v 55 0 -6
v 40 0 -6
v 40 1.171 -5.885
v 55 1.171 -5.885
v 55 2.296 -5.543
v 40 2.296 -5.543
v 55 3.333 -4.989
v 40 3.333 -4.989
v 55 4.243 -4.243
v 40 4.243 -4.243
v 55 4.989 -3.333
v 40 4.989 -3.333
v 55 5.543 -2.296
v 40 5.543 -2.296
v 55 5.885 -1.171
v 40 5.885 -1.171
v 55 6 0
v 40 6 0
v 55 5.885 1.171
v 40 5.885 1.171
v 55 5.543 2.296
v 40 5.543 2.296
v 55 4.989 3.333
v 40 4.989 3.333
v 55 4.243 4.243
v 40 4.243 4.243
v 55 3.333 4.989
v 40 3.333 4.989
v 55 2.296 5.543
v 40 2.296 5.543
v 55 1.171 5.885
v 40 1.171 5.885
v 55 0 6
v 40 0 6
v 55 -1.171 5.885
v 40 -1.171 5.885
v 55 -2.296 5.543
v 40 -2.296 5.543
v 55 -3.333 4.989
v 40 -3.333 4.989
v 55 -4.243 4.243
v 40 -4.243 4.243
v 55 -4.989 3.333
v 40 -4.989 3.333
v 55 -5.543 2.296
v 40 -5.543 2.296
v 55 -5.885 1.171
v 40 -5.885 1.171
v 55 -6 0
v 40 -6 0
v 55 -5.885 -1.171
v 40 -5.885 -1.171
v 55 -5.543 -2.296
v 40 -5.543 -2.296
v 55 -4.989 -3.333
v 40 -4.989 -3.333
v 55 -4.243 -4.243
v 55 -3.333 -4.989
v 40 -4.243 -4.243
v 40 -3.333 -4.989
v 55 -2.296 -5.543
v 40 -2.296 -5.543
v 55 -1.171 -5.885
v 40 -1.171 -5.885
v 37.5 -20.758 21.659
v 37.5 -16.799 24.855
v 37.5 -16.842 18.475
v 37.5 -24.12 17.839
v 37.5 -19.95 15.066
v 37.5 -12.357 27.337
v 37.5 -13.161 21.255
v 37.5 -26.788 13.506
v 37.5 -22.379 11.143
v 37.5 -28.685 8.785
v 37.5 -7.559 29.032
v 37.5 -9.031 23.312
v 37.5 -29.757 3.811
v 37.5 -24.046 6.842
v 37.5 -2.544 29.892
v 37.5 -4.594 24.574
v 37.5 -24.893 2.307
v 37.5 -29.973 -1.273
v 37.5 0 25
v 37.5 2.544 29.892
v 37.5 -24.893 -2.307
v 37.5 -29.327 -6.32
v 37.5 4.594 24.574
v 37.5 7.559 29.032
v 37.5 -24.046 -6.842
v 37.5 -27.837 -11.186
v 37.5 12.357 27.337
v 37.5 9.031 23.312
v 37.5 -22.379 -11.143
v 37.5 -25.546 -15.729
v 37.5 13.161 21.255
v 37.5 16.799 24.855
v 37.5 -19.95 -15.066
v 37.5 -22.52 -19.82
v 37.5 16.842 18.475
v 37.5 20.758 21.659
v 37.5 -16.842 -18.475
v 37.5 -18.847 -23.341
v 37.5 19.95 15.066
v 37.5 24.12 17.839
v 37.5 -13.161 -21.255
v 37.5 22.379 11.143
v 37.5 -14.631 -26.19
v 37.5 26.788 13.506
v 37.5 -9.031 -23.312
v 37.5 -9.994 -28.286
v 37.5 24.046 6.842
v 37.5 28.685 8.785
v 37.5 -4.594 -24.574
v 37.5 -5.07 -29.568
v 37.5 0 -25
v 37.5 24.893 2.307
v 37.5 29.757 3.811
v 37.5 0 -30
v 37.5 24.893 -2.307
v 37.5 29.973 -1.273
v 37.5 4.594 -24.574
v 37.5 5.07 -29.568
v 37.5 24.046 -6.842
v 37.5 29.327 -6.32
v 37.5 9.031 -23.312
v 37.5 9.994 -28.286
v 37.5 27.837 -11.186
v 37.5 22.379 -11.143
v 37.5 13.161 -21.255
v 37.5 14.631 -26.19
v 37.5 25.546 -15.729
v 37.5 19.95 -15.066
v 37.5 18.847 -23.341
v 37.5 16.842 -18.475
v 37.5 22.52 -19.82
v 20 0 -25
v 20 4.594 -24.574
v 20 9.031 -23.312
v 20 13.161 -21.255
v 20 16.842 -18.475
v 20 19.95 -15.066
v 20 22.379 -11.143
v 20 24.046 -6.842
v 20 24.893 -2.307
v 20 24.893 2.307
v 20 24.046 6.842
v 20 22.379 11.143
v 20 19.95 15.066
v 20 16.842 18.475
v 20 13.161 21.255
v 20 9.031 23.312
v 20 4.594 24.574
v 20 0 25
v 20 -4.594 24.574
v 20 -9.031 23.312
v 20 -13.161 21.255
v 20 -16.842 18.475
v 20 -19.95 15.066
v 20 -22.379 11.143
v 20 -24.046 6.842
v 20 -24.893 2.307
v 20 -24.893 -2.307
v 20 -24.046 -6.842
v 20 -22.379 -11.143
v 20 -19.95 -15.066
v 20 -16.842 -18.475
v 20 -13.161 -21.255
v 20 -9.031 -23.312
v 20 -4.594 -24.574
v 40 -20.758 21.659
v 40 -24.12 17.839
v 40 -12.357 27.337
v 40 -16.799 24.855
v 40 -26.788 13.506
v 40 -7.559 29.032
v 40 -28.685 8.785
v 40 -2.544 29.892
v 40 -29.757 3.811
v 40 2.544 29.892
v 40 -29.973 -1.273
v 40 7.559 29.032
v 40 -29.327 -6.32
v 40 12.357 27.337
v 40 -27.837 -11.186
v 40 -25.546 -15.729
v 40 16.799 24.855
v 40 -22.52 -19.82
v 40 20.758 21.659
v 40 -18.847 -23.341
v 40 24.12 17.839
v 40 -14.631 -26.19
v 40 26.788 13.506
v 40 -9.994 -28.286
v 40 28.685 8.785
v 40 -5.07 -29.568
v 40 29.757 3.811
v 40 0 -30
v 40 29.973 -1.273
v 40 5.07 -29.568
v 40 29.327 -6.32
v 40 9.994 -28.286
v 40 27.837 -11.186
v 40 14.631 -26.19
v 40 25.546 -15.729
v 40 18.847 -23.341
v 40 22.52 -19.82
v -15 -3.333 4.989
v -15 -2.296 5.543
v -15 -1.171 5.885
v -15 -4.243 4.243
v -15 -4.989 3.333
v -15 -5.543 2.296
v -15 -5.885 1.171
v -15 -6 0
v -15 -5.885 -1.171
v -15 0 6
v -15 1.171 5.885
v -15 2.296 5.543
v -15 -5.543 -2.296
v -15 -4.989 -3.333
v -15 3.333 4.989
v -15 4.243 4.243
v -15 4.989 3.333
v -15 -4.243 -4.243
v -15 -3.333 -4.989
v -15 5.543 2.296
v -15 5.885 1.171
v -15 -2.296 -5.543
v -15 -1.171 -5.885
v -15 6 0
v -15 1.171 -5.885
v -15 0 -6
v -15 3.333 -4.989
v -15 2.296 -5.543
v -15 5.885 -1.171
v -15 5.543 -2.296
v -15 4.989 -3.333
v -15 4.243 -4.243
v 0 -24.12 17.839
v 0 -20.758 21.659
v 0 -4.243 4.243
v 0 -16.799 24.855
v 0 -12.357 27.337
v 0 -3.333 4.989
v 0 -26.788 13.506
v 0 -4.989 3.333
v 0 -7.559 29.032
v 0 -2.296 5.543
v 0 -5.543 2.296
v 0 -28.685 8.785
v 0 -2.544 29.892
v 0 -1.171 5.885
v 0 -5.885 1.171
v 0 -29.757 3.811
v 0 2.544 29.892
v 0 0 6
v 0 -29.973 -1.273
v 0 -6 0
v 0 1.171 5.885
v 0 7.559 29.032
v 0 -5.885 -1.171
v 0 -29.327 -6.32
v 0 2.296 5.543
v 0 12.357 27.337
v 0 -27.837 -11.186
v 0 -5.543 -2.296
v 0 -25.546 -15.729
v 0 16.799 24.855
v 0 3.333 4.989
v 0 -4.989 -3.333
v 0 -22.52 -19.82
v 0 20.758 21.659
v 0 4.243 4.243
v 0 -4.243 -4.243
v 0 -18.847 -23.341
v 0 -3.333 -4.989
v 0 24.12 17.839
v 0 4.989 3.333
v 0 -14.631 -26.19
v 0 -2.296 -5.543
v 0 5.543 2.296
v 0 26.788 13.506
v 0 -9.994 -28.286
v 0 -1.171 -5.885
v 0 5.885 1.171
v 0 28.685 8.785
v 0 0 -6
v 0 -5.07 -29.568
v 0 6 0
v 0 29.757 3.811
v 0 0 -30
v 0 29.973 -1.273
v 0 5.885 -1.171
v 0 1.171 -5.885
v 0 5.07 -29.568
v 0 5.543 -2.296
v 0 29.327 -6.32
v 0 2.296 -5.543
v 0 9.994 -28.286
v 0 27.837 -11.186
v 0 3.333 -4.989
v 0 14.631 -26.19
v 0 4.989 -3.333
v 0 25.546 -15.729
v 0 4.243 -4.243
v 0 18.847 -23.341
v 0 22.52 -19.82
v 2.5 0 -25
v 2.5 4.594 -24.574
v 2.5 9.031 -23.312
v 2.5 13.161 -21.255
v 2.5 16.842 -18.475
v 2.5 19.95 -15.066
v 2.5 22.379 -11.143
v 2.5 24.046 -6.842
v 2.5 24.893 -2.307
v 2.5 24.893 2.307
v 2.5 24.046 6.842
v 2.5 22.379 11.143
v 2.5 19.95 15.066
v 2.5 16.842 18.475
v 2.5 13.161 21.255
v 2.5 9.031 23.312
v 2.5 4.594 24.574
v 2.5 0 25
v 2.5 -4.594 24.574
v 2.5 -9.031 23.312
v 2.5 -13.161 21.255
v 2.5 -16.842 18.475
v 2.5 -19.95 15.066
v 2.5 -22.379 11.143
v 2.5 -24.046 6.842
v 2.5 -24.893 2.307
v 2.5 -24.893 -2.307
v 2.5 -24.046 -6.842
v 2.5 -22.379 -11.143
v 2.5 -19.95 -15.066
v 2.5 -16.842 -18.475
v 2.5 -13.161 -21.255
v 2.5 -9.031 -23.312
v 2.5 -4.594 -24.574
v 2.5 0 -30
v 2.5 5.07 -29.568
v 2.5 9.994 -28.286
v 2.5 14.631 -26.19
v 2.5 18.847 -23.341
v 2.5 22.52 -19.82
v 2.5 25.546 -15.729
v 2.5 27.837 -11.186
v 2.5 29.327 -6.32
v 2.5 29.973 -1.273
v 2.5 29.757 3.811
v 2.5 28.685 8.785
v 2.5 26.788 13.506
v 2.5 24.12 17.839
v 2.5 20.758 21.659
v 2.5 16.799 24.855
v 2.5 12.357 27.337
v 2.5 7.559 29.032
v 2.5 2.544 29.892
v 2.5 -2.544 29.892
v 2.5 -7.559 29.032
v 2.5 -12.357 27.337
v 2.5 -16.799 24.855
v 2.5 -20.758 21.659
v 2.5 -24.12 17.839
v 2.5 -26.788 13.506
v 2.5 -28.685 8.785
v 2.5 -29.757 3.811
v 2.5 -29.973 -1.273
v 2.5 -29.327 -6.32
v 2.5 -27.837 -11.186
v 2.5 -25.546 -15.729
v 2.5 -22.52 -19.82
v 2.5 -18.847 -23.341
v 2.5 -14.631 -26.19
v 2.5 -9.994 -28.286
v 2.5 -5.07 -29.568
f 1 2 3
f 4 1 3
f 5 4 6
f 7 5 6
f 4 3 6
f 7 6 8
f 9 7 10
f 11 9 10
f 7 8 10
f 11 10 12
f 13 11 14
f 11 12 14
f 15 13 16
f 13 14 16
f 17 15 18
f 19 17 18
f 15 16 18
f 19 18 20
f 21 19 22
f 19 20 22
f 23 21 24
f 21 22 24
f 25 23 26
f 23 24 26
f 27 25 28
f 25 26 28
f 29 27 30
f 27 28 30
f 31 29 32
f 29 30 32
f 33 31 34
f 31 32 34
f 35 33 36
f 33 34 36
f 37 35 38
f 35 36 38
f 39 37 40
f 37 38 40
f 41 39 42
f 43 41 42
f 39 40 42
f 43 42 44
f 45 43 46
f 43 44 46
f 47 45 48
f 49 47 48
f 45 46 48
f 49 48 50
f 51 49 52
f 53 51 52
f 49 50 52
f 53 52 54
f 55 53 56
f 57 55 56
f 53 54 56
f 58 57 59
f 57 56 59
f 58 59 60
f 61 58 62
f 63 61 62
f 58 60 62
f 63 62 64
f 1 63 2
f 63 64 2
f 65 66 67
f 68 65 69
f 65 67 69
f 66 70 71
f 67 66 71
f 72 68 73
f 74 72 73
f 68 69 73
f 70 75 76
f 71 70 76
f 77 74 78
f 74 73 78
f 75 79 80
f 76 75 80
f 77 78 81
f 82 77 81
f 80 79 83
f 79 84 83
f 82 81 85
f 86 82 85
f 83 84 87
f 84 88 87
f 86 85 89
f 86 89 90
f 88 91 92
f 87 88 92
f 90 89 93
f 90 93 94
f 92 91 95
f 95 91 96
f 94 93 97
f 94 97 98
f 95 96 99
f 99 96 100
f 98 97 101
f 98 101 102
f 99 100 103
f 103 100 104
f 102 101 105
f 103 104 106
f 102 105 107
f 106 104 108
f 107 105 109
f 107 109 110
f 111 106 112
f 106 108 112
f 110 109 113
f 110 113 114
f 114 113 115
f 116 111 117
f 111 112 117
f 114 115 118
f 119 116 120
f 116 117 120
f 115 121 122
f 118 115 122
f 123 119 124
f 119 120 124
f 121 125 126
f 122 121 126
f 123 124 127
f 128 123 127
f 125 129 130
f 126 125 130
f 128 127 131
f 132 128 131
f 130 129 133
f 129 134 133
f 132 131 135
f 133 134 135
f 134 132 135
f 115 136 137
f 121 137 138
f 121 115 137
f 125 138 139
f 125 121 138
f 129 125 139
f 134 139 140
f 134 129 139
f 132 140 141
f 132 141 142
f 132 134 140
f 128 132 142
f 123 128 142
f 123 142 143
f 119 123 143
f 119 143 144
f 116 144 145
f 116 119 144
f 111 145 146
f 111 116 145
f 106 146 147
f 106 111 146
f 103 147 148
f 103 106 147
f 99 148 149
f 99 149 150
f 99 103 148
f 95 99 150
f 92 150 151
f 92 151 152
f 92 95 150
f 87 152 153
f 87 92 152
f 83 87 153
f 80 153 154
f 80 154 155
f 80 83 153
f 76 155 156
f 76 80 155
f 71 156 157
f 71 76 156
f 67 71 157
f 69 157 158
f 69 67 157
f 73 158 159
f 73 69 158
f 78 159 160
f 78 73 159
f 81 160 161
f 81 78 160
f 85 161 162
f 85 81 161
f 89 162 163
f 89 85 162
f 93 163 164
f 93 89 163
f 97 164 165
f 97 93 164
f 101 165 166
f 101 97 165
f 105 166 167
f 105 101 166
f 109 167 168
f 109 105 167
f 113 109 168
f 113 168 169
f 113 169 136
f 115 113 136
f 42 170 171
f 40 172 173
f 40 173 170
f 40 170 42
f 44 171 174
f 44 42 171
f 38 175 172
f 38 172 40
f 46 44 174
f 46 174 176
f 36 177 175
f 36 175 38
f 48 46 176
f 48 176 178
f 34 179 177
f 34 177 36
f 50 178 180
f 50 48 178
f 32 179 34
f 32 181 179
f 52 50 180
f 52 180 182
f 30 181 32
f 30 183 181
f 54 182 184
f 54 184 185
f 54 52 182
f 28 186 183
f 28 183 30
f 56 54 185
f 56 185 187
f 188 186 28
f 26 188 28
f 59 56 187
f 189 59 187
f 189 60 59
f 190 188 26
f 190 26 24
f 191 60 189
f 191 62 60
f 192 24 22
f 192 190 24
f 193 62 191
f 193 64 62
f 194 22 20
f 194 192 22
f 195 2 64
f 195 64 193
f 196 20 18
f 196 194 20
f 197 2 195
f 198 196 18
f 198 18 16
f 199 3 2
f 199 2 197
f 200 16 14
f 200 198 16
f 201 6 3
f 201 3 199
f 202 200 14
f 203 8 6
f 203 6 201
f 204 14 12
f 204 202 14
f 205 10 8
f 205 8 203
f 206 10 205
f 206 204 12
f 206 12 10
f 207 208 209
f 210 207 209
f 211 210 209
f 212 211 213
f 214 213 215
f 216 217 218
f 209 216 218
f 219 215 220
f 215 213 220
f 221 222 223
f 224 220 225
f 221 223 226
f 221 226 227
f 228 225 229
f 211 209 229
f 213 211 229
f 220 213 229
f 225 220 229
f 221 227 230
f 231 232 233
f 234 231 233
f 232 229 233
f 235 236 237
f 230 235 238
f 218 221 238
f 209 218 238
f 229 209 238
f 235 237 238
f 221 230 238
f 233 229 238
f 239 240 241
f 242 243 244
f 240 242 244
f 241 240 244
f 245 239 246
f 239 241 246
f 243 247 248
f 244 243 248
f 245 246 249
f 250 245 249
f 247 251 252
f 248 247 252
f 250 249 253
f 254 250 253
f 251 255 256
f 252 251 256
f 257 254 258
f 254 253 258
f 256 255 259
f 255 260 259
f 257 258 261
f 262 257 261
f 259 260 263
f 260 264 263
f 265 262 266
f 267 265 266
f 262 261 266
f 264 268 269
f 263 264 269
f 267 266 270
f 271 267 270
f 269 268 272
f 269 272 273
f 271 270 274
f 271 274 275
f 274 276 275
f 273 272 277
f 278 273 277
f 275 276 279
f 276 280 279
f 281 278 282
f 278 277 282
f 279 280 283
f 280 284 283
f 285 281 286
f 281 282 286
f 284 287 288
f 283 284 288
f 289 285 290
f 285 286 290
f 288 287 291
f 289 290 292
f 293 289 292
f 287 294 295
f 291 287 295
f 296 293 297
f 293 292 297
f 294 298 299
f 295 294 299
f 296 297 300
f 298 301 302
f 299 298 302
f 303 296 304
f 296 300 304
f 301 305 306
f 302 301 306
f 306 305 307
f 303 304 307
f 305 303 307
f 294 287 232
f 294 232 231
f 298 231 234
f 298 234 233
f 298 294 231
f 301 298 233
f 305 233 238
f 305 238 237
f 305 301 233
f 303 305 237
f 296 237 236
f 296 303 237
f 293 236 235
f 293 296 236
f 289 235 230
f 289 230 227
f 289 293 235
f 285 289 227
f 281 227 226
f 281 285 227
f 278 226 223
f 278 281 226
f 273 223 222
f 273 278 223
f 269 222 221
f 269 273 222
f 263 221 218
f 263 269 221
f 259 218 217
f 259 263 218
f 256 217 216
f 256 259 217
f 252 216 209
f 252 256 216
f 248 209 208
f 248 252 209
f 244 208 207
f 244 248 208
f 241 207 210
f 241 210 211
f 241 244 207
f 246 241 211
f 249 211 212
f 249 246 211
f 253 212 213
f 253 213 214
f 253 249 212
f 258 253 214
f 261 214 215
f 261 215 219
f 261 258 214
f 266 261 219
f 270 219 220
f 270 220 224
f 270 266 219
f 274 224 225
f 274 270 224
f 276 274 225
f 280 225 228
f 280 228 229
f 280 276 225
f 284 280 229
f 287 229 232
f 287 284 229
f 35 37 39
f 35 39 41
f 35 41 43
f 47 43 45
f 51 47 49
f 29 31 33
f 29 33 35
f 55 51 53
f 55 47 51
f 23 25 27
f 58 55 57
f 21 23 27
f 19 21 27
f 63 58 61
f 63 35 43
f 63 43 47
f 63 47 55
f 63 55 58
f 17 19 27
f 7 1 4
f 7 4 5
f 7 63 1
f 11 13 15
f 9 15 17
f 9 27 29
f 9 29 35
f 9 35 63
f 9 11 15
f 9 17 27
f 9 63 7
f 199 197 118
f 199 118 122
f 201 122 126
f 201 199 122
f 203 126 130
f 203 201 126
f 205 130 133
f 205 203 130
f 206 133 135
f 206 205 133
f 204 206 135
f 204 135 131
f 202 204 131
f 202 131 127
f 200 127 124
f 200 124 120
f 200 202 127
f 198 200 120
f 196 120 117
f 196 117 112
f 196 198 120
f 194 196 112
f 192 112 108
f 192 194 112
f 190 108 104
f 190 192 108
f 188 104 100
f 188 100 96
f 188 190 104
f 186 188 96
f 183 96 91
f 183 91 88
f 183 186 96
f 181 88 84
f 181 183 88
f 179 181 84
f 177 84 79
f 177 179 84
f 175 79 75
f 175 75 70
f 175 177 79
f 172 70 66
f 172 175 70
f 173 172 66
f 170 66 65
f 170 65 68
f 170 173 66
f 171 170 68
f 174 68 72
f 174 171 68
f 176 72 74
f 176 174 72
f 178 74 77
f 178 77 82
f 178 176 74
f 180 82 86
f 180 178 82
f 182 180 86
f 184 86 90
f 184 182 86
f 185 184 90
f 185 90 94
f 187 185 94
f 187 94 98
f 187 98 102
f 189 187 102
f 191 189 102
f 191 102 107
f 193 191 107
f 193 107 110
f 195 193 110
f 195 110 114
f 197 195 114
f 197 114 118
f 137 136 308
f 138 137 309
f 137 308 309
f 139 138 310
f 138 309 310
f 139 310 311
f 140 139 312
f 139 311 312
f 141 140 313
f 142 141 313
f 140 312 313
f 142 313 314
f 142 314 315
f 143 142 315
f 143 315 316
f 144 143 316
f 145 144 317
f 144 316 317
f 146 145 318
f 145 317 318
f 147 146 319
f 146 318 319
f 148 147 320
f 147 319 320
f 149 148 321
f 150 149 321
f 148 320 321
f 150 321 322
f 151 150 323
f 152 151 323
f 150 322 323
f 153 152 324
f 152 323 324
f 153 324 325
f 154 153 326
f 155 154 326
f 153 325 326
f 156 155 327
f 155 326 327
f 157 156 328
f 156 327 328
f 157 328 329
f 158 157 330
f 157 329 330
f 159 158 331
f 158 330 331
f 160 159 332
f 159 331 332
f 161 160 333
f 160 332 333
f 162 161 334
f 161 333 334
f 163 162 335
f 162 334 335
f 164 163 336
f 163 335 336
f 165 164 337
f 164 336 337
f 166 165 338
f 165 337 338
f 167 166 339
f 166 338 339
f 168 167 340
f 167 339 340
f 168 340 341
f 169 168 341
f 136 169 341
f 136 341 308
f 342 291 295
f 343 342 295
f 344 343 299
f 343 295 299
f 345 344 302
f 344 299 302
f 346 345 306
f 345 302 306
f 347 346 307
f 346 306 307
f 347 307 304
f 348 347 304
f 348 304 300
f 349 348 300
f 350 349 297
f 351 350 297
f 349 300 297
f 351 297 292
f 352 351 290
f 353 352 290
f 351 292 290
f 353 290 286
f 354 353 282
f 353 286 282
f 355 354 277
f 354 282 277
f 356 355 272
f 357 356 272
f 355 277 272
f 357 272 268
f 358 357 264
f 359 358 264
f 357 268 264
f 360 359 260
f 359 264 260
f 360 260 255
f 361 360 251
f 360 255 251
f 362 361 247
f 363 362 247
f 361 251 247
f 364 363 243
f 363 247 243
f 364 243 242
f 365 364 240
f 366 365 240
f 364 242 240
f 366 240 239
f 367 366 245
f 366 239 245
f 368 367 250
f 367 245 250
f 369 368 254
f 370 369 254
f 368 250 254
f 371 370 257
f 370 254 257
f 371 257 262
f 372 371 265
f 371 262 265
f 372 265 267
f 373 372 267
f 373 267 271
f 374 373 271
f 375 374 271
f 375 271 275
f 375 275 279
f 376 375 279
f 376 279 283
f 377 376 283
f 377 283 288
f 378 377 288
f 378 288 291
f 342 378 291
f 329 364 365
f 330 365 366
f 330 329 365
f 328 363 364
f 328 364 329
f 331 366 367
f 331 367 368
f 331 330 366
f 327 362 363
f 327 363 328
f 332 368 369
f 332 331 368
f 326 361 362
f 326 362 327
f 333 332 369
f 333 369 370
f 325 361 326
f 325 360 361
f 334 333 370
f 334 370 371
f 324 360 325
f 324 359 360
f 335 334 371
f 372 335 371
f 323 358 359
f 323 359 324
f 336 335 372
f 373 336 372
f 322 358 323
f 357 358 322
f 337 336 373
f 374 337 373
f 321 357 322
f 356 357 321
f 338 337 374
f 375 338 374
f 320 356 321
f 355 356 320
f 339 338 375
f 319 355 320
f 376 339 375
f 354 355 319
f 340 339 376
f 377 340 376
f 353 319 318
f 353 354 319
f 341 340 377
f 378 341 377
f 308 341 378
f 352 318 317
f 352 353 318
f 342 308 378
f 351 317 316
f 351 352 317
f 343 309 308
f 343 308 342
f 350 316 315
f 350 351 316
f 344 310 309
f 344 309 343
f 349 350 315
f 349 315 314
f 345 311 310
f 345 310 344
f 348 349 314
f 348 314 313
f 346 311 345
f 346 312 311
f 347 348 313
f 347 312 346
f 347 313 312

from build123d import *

# Parameters (mm, degrees)
SKETCH3_R           = 6
BOSS_EXTRUDE1_DEPTH = 15
SKETCH4_R           = 30
BOSS_EXTRUDE2_DEPTH = 2.5
BOSS_EXTRUDE3_START = 2.5
SKETCH4_3_R         = 25
BOSS_EXTRUDE3_DEPTH = 17.5


with BuildPart() as part:
    # Sketch3 → Boss-Extrude1 (new body)
    with BuildSketch(Plane(origin=(0, 0, 0), x_dir=(0, 0, -1), z_dir=(1, 0, 0))):
        Circle(SKETCH3_R)
    boss_extrude1 = extrude(amount=-BOSS_EXTRUDE1_DEPTH)

    # Sketch4 → Boss-Extrude2 (add)
    with BuildSketch(Plane(origin=(0, 0, 0), x_dir=(0, 0, -1), z_dir=(1, 0, 0))):
        Circle(SKETCH4_R)
    boss_extrude2 = extrude(amount=BOSS_EXTRUDE2_DEPTH)

    # Sketch4<3> → Boss-Extrude3 (add)
    with BuildSketch(Plane(origin=(0, 0, 0), x_dir=(0, 0, -1), z_dir=(1, 0, 0)).offset(BOSS_EXTRUDE3_START)):
        Circle(SKETCH4_3_R)
    boss_extrude3 = extrude(amount=BOSS_EXTRUDE3_DEPTH)

    # Mirror1: Boss-Extrude3 across plane
    add(boss_extrude3.mirror(Plane(origin=(20, 0, 0), x_dir=(0, 0, 1), z_dir=(1, 0, 0))))

    # Mirror2: Boss-Extrude2 across plane
    add(boss_extrude2.mirror(Plane(origin=(20, 0, 0), x_dir=(0, 0, 1), z_dir=(1, 0, 0))))

    # Mirror3: Boss-Extrude1 across plane
    add(boss_extrude1.mirror(Plane(origin=(20, 0, 0), x_dir=(0, 0, 1), z_dir=(1, 0, 0))))


solid = part.part
